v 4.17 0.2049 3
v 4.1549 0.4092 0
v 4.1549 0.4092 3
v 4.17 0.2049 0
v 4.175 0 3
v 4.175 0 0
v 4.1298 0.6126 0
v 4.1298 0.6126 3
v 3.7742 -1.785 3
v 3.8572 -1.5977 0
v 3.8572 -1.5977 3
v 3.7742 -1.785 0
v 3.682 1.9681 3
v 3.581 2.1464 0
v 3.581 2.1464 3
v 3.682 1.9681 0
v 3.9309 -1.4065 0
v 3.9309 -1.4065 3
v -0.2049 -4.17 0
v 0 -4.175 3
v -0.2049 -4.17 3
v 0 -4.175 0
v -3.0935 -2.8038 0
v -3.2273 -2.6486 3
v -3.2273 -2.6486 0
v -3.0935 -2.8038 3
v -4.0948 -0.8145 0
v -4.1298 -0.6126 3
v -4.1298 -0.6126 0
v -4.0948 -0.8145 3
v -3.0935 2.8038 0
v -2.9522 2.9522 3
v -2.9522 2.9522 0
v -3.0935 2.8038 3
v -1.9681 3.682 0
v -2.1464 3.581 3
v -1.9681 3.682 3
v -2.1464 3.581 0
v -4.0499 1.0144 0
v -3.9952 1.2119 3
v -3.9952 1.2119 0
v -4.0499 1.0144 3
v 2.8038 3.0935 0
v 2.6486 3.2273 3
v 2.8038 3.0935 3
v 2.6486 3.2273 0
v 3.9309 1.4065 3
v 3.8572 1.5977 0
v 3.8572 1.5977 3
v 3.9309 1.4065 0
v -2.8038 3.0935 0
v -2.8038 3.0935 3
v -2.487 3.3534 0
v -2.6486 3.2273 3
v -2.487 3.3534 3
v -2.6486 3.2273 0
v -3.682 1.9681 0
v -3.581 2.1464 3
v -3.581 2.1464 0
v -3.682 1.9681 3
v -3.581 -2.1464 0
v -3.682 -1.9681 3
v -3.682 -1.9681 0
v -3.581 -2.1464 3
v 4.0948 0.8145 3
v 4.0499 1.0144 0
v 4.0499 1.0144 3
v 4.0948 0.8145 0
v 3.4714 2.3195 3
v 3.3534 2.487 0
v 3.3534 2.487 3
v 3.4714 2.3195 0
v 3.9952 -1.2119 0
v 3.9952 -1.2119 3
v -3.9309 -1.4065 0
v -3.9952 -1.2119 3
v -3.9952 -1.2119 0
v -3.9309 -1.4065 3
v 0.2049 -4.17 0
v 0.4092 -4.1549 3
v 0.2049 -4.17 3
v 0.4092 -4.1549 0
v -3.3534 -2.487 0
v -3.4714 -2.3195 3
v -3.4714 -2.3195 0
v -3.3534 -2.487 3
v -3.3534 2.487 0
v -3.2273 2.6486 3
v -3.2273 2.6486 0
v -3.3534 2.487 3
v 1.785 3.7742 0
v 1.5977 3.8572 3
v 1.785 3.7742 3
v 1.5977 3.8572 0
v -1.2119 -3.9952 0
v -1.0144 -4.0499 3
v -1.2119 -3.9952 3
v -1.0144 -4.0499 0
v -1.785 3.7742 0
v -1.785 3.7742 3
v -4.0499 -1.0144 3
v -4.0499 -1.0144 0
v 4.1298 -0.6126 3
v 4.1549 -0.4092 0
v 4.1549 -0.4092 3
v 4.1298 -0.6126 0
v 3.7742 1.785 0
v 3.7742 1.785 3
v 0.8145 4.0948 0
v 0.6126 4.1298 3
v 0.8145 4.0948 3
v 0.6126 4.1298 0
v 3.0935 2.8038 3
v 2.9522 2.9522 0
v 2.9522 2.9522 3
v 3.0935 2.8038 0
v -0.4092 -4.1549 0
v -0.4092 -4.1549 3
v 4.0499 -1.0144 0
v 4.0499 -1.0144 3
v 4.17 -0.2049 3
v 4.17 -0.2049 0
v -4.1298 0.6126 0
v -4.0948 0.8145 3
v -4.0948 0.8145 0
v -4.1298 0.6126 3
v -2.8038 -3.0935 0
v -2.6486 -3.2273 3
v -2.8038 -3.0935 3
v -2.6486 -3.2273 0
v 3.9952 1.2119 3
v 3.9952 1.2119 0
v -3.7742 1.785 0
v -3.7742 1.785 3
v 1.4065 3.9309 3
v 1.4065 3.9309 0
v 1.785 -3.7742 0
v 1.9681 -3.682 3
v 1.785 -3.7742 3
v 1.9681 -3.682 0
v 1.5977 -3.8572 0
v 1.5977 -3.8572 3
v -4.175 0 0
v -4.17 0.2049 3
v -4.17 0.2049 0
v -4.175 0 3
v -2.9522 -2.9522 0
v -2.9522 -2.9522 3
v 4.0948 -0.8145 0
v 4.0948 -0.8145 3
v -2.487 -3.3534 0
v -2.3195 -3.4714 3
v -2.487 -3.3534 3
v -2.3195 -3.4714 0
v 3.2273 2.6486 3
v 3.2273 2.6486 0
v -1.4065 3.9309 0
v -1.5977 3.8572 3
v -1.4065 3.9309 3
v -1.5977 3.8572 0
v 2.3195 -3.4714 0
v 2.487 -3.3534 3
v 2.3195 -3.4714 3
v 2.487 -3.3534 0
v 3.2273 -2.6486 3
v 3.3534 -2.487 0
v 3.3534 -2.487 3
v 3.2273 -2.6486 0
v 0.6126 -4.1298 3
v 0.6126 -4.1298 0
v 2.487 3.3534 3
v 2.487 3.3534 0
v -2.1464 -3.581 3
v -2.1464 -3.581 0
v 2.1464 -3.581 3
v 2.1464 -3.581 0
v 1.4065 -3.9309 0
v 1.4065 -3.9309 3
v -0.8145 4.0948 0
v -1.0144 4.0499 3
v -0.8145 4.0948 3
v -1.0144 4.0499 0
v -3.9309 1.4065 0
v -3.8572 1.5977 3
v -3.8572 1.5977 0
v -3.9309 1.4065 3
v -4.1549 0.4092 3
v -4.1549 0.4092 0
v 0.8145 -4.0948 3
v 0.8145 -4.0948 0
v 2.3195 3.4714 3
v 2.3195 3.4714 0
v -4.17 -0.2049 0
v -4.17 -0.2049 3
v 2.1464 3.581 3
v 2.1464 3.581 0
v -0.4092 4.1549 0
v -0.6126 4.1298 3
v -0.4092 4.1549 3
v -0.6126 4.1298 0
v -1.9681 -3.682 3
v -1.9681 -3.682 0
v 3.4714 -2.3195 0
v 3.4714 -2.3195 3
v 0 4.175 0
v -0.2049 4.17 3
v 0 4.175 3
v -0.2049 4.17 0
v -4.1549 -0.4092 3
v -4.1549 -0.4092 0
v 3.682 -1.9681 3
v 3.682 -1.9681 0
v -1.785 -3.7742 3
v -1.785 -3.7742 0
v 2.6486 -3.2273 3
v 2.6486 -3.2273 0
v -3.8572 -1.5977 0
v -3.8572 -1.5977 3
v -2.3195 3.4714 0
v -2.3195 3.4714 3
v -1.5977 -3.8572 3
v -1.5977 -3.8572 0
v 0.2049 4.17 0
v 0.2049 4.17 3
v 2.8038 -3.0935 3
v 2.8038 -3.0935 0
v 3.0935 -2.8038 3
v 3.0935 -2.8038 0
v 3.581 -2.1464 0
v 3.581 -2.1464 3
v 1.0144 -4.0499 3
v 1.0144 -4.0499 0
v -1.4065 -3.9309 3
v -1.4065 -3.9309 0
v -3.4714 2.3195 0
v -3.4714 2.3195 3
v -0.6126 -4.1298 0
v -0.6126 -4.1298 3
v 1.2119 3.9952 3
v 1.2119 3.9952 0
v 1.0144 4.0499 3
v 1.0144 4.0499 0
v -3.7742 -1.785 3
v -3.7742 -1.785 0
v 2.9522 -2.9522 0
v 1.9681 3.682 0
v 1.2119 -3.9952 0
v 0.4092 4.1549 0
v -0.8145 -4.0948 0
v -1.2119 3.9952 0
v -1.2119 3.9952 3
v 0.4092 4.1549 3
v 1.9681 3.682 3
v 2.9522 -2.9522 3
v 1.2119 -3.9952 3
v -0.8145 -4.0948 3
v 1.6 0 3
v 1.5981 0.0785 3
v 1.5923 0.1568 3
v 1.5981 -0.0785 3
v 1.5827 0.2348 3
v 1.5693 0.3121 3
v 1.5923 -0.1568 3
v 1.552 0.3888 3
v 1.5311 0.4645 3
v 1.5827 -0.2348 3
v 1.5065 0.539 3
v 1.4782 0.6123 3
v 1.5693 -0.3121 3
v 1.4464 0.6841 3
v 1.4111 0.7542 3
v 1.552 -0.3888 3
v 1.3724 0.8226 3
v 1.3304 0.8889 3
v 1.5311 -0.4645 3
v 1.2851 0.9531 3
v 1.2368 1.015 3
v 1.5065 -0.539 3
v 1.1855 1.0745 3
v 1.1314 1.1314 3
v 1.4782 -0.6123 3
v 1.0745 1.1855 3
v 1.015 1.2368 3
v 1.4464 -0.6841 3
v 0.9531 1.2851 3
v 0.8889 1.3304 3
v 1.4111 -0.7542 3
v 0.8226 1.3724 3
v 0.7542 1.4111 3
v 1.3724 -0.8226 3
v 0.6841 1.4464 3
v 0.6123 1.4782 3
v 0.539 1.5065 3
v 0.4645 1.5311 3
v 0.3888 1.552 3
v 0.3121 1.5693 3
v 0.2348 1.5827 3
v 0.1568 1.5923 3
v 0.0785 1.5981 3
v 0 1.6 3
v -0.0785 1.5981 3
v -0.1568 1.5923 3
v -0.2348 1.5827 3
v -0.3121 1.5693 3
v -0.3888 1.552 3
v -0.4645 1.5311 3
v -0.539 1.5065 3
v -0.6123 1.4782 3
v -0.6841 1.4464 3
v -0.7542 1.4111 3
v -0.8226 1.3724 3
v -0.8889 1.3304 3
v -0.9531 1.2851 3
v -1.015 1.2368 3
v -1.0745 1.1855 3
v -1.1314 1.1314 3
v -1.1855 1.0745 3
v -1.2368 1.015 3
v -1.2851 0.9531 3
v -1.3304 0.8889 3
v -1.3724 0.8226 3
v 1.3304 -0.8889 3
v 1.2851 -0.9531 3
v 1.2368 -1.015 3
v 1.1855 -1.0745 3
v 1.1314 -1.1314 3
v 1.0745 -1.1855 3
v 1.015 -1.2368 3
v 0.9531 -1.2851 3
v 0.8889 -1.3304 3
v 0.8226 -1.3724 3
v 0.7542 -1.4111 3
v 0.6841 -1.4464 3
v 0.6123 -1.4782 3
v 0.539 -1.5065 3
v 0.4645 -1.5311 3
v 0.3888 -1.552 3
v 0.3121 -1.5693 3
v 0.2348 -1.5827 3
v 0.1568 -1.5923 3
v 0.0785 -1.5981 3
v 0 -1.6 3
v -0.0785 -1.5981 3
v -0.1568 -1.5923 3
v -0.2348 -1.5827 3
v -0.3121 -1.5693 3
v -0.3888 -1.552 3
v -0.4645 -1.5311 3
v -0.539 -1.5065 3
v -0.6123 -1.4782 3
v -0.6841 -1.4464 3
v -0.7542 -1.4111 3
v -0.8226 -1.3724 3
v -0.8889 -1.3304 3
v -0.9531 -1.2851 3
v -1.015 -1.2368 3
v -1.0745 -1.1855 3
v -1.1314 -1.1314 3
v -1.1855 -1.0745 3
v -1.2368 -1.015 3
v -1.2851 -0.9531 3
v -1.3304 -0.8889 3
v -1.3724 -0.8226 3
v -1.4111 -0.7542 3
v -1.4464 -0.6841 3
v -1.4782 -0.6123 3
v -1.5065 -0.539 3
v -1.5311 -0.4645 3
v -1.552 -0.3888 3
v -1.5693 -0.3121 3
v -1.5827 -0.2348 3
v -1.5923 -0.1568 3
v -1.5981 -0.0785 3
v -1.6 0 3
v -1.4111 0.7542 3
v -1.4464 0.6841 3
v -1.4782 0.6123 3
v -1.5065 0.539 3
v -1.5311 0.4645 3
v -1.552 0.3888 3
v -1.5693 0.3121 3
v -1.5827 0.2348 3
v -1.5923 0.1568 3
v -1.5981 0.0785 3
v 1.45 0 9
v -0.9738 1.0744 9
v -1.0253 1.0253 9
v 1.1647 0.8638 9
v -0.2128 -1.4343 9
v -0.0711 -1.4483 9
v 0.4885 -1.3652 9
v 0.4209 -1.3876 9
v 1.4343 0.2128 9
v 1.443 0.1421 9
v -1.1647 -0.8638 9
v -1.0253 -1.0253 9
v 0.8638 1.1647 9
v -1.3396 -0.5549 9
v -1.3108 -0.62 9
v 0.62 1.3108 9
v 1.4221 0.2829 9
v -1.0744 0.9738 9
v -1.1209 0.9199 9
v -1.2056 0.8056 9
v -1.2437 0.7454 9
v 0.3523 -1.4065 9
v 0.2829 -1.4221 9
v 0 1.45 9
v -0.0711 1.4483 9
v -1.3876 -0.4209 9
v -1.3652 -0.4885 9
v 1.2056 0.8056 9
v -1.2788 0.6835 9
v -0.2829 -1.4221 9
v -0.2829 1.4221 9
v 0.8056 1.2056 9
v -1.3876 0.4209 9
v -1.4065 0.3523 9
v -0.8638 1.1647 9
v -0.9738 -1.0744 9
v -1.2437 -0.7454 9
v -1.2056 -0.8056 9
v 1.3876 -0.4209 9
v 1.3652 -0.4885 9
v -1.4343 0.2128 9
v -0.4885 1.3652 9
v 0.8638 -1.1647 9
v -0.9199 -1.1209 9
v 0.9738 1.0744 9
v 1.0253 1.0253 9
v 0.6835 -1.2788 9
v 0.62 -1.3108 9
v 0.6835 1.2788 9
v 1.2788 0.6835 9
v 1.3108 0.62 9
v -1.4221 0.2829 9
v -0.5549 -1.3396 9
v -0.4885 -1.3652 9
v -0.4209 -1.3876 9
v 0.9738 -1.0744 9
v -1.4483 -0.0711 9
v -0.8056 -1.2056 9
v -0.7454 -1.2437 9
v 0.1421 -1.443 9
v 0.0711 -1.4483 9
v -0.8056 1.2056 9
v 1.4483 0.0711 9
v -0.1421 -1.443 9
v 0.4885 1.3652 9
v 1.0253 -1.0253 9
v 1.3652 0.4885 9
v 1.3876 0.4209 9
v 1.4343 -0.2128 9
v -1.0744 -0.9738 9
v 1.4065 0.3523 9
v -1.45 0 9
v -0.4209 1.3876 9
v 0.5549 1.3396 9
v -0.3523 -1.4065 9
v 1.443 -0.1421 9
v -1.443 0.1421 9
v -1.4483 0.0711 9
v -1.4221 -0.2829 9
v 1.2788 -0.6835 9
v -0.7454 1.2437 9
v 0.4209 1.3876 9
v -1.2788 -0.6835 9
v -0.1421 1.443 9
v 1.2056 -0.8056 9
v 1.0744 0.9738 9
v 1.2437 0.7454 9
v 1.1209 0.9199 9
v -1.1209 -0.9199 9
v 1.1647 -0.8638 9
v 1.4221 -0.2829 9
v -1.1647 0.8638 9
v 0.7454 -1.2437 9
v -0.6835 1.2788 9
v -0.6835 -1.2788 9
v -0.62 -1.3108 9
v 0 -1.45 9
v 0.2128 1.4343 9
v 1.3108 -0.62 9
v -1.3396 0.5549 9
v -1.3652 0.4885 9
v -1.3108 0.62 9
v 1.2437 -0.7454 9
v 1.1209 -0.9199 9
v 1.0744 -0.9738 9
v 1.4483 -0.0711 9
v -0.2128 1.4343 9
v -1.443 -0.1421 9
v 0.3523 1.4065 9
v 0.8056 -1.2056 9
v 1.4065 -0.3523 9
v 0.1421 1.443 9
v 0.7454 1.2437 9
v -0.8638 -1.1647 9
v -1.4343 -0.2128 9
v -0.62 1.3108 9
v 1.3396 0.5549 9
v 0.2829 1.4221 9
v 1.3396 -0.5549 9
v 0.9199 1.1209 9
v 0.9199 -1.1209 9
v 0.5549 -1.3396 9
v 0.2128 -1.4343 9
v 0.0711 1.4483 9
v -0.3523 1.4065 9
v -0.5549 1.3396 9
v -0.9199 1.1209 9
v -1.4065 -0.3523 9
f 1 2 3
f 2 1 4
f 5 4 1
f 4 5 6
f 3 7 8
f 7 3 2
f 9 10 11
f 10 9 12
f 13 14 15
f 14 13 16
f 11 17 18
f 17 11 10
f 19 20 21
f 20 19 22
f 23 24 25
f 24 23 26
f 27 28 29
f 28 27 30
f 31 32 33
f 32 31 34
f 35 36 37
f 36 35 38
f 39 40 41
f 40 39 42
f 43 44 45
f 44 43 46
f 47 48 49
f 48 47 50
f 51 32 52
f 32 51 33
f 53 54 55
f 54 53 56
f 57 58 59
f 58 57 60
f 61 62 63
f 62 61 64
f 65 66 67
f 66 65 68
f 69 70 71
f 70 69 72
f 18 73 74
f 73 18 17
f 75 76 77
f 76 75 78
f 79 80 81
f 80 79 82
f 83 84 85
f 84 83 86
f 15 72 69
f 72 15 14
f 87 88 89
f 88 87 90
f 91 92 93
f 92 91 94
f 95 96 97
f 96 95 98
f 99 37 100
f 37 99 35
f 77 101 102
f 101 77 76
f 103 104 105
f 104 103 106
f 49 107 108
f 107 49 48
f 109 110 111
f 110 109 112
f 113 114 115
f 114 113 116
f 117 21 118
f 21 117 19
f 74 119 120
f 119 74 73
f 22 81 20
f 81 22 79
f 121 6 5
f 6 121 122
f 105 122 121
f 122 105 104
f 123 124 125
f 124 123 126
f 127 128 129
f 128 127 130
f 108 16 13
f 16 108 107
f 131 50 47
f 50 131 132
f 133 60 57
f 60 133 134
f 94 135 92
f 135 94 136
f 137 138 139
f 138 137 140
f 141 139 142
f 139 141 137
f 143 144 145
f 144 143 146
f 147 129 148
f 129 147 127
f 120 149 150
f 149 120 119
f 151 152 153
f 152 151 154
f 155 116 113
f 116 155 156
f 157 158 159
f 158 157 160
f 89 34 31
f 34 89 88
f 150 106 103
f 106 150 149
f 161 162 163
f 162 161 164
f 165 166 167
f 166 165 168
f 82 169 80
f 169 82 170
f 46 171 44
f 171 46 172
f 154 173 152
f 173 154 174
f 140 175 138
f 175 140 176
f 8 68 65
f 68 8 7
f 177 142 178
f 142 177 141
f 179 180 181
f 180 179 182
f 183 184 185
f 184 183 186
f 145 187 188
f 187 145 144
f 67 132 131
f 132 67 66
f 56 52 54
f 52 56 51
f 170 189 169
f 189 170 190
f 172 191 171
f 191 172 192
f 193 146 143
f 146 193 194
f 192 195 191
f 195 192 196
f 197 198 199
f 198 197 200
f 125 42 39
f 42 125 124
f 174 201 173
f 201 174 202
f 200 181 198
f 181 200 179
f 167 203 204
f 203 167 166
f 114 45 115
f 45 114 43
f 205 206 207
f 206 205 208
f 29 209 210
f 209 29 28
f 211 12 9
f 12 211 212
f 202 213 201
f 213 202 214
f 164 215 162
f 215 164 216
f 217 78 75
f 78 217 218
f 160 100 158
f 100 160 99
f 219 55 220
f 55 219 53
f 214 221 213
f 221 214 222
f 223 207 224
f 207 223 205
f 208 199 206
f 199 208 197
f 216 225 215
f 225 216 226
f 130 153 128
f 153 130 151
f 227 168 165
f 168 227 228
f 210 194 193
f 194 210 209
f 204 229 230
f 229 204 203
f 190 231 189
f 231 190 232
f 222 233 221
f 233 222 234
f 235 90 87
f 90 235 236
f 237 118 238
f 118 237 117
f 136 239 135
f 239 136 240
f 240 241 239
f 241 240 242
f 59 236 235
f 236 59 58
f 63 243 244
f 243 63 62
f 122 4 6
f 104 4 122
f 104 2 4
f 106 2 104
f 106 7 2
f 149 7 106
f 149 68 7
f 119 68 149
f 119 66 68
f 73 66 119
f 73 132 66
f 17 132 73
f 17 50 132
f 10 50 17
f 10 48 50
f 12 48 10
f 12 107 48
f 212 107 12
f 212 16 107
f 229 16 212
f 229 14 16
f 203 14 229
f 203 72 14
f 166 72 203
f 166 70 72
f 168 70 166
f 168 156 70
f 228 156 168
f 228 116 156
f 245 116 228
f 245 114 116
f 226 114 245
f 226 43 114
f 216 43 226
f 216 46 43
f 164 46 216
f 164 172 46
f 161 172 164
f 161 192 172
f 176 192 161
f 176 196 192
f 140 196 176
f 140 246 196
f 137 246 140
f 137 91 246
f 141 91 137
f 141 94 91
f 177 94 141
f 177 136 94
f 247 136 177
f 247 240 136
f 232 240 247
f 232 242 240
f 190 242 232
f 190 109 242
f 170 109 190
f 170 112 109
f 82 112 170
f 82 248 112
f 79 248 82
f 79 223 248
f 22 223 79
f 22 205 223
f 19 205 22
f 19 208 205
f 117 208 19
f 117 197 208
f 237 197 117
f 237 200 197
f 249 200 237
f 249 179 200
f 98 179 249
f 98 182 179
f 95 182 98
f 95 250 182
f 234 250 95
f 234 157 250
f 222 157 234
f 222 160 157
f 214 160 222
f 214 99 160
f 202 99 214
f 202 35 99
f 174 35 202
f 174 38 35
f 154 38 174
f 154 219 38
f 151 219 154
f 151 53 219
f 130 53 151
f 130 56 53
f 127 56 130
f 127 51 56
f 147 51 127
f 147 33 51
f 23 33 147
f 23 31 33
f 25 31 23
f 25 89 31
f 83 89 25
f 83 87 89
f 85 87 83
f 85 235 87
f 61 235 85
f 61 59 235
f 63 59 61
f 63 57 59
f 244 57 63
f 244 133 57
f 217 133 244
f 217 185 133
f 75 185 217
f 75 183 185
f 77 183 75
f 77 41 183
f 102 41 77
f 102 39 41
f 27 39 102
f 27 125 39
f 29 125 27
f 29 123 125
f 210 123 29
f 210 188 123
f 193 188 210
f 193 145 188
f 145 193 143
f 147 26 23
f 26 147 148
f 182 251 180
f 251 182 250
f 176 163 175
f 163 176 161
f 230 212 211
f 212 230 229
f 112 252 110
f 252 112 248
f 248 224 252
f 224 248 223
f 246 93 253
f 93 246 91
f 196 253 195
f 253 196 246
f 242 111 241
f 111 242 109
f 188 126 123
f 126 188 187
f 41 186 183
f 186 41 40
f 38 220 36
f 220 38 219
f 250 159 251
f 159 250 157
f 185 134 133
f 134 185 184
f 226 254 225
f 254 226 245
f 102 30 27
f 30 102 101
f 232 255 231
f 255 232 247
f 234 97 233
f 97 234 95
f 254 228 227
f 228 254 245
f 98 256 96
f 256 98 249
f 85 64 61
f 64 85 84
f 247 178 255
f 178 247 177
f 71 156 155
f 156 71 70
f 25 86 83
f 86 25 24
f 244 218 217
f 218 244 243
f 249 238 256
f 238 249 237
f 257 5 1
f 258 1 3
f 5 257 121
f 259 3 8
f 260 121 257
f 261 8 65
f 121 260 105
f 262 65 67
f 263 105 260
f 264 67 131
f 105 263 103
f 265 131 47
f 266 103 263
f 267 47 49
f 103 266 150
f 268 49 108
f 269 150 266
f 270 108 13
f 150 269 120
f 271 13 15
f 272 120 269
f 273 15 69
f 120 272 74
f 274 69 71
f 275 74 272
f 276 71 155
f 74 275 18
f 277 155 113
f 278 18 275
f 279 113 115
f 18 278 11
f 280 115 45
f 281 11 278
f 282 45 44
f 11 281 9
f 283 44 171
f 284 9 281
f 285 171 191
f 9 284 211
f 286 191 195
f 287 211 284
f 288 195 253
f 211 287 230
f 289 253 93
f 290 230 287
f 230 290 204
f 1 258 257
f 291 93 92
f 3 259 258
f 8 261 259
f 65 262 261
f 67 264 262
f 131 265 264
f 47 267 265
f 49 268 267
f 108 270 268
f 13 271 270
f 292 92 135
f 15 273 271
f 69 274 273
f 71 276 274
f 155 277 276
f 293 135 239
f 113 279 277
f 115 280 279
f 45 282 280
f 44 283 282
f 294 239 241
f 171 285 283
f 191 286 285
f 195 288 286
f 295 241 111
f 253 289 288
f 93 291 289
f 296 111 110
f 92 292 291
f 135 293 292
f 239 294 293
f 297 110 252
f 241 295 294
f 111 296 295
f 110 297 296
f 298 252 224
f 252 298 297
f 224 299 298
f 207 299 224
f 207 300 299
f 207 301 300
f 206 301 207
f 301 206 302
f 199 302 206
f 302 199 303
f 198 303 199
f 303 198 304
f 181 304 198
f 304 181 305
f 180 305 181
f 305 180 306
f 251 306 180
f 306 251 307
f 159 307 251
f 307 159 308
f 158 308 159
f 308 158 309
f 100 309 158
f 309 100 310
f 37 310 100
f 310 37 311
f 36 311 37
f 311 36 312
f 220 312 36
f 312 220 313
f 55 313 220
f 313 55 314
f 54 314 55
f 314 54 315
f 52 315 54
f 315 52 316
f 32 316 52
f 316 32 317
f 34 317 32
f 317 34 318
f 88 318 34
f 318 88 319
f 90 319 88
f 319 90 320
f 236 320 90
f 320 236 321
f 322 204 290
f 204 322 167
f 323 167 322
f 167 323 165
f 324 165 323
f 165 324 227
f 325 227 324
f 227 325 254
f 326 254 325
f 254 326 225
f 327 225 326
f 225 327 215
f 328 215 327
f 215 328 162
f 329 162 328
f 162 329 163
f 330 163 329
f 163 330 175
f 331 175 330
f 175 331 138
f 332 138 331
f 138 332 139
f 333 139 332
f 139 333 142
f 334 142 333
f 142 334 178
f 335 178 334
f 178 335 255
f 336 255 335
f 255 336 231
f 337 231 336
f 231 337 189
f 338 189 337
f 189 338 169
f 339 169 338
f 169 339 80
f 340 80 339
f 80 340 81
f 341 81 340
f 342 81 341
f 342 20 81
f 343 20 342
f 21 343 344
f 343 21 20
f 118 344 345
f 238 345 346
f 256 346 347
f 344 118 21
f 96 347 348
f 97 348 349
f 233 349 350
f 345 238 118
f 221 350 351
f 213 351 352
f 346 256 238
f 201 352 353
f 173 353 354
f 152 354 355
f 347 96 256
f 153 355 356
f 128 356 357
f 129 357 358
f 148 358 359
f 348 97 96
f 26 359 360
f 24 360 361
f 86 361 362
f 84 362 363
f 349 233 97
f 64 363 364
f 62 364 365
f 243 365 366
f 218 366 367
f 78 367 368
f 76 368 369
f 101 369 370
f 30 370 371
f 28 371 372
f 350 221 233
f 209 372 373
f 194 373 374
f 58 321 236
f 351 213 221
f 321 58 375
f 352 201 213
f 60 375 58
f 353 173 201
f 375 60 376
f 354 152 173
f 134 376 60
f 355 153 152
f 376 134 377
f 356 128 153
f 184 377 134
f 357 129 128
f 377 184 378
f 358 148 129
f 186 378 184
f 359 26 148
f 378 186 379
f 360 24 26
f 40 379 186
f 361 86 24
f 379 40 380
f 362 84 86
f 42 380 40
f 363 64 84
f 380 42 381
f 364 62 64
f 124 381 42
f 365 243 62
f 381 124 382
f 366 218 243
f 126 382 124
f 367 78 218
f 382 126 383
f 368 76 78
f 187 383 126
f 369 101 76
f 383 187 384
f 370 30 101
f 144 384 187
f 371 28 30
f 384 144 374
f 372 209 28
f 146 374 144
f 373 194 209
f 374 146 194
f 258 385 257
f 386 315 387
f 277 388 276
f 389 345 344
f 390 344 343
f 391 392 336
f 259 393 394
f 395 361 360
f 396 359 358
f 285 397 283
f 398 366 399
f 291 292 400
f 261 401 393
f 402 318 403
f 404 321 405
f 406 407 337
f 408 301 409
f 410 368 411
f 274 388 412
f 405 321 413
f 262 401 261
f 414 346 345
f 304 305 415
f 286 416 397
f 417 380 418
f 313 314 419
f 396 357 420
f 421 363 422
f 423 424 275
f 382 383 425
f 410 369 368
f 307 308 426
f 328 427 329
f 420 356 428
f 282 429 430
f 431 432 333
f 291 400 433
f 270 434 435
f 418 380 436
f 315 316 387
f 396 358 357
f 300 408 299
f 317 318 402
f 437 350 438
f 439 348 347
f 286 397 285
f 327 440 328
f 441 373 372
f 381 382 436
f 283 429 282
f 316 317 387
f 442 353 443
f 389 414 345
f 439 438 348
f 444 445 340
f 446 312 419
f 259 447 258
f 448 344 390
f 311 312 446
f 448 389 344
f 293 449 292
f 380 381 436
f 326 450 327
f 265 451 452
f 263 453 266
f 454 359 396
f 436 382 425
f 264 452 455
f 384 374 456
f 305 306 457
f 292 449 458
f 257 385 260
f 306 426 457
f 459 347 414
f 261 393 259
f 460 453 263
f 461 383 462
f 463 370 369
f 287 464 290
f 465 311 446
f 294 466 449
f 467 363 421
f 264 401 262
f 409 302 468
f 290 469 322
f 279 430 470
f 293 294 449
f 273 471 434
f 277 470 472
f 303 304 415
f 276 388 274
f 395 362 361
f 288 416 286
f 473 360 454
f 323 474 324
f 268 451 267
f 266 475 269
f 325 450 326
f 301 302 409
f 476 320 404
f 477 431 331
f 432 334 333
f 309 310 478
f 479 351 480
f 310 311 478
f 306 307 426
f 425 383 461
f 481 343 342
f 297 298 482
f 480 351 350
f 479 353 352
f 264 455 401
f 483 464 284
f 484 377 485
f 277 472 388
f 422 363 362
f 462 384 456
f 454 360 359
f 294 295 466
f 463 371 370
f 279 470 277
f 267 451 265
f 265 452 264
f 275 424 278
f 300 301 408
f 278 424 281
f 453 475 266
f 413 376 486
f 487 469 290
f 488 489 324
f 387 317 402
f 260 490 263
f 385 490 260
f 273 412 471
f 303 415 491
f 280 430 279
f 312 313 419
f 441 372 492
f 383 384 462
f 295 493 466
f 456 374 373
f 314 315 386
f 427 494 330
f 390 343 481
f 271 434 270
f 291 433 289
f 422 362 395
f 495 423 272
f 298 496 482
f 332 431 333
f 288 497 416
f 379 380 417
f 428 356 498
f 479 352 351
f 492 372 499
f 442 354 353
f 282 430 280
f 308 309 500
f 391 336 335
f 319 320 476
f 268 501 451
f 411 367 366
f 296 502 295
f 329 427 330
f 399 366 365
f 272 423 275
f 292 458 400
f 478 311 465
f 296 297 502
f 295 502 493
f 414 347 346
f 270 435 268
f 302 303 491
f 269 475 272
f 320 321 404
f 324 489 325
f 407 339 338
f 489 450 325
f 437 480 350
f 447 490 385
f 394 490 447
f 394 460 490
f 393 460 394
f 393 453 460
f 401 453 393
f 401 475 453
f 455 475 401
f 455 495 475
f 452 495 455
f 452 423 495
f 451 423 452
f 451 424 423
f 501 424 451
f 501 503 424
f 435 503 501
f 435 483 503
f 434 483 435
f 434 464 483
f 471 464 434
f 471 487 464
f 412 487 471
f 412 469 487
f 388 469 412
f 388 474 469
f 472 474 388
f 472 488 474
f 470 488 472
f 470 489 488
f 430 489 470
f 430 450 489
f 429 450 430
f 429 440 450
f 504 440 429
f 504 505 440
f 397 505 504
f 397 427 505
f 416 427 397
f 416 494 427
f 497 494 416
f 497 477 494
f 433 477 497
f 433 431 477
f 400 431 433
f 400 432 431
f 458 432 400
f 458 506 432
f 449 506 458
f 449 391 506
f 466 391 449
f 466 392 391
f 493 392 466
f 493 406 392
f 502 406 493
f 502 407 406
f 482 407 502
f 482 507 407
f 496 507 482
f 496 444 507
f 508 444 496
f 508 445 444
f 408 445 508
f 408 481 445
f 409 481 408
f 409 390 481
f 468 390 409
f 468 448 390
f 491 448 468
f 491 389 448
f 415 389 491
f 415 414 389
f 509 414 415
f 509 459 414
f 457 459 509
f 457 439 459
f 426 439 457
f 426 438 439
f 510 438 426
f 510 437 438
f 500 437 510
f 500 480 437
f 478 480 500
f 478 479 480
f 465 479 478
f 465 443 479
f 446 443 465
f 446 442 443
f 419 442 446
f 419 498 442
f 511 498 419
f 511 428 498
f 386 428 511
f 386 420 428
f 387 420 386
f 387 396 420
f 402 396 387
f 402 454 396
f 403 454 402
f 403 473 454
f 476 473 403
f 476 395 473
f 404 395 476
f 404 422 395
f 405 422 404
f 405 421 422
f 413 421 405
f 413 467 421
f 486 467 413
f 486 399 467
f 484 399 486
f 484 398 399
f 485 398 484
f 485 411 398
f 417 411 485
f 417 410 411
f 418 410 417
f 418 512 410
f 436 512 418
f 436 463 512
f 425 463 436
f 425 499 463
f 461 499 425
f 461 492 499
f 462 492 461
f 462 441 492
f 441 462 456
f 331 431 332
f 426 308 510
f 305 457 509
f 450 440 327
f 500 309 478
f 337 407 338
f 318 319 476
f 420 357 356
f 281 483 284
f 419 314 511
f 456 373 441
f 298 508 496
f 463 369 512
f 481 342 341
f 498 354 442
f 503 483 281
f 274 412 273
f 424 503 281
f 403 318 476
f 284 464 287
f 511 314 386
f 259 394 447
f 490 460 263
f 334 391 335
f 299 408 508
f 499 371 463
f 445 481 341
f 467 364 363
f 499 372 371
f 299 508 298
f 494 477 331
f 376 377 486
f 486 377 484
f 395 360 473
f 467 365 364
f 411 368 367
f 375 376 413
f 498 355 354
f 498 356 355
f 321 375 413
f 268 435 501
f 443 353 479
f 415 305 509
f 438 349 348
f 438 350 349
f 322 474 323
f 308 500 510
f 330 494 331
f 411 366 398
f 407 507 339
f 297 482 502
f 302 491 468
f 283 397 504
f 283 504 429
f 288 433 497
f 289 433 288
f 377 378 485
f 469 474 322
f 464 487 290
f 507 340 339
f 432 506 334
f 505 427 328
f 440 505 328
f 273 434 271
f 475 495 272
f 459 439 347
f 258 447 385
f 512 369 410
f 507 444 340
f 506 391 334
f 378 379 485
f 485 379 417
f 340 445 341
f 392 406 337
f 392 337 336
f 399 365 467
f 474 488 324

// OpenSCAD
screwEnvelope();

module screwEnvelope(
    center_screwed_position = false,
    diameter_ajustment_head = 0.2,
    diameter_ajustment_screw = -0.1,
    _fn = 128
) {

    head_height = 2.1;
    middle_height = 0.9;
    bottom_height = 6;

    z_centring_translation = center_screwed_position ? -head_height -middle_height : 0;

    translate([0,0, z_centring_translation])
        union() {
            cylinder(
                r = 7.95 / 2 + diameter_ajustment_head,
                h = head_height + middle_height,
                $fn = _fn);
            translate([0, 0, head_height + middle_height])
                cylinder(
                    r1 = 3.4 / 2 + diameter_ajustment_screw,
                    r2 = 3.1 / 2 + diameter_ajustment_screw,
                    h = bottom_height,
                    $fn = _fn
                );
        }
}
